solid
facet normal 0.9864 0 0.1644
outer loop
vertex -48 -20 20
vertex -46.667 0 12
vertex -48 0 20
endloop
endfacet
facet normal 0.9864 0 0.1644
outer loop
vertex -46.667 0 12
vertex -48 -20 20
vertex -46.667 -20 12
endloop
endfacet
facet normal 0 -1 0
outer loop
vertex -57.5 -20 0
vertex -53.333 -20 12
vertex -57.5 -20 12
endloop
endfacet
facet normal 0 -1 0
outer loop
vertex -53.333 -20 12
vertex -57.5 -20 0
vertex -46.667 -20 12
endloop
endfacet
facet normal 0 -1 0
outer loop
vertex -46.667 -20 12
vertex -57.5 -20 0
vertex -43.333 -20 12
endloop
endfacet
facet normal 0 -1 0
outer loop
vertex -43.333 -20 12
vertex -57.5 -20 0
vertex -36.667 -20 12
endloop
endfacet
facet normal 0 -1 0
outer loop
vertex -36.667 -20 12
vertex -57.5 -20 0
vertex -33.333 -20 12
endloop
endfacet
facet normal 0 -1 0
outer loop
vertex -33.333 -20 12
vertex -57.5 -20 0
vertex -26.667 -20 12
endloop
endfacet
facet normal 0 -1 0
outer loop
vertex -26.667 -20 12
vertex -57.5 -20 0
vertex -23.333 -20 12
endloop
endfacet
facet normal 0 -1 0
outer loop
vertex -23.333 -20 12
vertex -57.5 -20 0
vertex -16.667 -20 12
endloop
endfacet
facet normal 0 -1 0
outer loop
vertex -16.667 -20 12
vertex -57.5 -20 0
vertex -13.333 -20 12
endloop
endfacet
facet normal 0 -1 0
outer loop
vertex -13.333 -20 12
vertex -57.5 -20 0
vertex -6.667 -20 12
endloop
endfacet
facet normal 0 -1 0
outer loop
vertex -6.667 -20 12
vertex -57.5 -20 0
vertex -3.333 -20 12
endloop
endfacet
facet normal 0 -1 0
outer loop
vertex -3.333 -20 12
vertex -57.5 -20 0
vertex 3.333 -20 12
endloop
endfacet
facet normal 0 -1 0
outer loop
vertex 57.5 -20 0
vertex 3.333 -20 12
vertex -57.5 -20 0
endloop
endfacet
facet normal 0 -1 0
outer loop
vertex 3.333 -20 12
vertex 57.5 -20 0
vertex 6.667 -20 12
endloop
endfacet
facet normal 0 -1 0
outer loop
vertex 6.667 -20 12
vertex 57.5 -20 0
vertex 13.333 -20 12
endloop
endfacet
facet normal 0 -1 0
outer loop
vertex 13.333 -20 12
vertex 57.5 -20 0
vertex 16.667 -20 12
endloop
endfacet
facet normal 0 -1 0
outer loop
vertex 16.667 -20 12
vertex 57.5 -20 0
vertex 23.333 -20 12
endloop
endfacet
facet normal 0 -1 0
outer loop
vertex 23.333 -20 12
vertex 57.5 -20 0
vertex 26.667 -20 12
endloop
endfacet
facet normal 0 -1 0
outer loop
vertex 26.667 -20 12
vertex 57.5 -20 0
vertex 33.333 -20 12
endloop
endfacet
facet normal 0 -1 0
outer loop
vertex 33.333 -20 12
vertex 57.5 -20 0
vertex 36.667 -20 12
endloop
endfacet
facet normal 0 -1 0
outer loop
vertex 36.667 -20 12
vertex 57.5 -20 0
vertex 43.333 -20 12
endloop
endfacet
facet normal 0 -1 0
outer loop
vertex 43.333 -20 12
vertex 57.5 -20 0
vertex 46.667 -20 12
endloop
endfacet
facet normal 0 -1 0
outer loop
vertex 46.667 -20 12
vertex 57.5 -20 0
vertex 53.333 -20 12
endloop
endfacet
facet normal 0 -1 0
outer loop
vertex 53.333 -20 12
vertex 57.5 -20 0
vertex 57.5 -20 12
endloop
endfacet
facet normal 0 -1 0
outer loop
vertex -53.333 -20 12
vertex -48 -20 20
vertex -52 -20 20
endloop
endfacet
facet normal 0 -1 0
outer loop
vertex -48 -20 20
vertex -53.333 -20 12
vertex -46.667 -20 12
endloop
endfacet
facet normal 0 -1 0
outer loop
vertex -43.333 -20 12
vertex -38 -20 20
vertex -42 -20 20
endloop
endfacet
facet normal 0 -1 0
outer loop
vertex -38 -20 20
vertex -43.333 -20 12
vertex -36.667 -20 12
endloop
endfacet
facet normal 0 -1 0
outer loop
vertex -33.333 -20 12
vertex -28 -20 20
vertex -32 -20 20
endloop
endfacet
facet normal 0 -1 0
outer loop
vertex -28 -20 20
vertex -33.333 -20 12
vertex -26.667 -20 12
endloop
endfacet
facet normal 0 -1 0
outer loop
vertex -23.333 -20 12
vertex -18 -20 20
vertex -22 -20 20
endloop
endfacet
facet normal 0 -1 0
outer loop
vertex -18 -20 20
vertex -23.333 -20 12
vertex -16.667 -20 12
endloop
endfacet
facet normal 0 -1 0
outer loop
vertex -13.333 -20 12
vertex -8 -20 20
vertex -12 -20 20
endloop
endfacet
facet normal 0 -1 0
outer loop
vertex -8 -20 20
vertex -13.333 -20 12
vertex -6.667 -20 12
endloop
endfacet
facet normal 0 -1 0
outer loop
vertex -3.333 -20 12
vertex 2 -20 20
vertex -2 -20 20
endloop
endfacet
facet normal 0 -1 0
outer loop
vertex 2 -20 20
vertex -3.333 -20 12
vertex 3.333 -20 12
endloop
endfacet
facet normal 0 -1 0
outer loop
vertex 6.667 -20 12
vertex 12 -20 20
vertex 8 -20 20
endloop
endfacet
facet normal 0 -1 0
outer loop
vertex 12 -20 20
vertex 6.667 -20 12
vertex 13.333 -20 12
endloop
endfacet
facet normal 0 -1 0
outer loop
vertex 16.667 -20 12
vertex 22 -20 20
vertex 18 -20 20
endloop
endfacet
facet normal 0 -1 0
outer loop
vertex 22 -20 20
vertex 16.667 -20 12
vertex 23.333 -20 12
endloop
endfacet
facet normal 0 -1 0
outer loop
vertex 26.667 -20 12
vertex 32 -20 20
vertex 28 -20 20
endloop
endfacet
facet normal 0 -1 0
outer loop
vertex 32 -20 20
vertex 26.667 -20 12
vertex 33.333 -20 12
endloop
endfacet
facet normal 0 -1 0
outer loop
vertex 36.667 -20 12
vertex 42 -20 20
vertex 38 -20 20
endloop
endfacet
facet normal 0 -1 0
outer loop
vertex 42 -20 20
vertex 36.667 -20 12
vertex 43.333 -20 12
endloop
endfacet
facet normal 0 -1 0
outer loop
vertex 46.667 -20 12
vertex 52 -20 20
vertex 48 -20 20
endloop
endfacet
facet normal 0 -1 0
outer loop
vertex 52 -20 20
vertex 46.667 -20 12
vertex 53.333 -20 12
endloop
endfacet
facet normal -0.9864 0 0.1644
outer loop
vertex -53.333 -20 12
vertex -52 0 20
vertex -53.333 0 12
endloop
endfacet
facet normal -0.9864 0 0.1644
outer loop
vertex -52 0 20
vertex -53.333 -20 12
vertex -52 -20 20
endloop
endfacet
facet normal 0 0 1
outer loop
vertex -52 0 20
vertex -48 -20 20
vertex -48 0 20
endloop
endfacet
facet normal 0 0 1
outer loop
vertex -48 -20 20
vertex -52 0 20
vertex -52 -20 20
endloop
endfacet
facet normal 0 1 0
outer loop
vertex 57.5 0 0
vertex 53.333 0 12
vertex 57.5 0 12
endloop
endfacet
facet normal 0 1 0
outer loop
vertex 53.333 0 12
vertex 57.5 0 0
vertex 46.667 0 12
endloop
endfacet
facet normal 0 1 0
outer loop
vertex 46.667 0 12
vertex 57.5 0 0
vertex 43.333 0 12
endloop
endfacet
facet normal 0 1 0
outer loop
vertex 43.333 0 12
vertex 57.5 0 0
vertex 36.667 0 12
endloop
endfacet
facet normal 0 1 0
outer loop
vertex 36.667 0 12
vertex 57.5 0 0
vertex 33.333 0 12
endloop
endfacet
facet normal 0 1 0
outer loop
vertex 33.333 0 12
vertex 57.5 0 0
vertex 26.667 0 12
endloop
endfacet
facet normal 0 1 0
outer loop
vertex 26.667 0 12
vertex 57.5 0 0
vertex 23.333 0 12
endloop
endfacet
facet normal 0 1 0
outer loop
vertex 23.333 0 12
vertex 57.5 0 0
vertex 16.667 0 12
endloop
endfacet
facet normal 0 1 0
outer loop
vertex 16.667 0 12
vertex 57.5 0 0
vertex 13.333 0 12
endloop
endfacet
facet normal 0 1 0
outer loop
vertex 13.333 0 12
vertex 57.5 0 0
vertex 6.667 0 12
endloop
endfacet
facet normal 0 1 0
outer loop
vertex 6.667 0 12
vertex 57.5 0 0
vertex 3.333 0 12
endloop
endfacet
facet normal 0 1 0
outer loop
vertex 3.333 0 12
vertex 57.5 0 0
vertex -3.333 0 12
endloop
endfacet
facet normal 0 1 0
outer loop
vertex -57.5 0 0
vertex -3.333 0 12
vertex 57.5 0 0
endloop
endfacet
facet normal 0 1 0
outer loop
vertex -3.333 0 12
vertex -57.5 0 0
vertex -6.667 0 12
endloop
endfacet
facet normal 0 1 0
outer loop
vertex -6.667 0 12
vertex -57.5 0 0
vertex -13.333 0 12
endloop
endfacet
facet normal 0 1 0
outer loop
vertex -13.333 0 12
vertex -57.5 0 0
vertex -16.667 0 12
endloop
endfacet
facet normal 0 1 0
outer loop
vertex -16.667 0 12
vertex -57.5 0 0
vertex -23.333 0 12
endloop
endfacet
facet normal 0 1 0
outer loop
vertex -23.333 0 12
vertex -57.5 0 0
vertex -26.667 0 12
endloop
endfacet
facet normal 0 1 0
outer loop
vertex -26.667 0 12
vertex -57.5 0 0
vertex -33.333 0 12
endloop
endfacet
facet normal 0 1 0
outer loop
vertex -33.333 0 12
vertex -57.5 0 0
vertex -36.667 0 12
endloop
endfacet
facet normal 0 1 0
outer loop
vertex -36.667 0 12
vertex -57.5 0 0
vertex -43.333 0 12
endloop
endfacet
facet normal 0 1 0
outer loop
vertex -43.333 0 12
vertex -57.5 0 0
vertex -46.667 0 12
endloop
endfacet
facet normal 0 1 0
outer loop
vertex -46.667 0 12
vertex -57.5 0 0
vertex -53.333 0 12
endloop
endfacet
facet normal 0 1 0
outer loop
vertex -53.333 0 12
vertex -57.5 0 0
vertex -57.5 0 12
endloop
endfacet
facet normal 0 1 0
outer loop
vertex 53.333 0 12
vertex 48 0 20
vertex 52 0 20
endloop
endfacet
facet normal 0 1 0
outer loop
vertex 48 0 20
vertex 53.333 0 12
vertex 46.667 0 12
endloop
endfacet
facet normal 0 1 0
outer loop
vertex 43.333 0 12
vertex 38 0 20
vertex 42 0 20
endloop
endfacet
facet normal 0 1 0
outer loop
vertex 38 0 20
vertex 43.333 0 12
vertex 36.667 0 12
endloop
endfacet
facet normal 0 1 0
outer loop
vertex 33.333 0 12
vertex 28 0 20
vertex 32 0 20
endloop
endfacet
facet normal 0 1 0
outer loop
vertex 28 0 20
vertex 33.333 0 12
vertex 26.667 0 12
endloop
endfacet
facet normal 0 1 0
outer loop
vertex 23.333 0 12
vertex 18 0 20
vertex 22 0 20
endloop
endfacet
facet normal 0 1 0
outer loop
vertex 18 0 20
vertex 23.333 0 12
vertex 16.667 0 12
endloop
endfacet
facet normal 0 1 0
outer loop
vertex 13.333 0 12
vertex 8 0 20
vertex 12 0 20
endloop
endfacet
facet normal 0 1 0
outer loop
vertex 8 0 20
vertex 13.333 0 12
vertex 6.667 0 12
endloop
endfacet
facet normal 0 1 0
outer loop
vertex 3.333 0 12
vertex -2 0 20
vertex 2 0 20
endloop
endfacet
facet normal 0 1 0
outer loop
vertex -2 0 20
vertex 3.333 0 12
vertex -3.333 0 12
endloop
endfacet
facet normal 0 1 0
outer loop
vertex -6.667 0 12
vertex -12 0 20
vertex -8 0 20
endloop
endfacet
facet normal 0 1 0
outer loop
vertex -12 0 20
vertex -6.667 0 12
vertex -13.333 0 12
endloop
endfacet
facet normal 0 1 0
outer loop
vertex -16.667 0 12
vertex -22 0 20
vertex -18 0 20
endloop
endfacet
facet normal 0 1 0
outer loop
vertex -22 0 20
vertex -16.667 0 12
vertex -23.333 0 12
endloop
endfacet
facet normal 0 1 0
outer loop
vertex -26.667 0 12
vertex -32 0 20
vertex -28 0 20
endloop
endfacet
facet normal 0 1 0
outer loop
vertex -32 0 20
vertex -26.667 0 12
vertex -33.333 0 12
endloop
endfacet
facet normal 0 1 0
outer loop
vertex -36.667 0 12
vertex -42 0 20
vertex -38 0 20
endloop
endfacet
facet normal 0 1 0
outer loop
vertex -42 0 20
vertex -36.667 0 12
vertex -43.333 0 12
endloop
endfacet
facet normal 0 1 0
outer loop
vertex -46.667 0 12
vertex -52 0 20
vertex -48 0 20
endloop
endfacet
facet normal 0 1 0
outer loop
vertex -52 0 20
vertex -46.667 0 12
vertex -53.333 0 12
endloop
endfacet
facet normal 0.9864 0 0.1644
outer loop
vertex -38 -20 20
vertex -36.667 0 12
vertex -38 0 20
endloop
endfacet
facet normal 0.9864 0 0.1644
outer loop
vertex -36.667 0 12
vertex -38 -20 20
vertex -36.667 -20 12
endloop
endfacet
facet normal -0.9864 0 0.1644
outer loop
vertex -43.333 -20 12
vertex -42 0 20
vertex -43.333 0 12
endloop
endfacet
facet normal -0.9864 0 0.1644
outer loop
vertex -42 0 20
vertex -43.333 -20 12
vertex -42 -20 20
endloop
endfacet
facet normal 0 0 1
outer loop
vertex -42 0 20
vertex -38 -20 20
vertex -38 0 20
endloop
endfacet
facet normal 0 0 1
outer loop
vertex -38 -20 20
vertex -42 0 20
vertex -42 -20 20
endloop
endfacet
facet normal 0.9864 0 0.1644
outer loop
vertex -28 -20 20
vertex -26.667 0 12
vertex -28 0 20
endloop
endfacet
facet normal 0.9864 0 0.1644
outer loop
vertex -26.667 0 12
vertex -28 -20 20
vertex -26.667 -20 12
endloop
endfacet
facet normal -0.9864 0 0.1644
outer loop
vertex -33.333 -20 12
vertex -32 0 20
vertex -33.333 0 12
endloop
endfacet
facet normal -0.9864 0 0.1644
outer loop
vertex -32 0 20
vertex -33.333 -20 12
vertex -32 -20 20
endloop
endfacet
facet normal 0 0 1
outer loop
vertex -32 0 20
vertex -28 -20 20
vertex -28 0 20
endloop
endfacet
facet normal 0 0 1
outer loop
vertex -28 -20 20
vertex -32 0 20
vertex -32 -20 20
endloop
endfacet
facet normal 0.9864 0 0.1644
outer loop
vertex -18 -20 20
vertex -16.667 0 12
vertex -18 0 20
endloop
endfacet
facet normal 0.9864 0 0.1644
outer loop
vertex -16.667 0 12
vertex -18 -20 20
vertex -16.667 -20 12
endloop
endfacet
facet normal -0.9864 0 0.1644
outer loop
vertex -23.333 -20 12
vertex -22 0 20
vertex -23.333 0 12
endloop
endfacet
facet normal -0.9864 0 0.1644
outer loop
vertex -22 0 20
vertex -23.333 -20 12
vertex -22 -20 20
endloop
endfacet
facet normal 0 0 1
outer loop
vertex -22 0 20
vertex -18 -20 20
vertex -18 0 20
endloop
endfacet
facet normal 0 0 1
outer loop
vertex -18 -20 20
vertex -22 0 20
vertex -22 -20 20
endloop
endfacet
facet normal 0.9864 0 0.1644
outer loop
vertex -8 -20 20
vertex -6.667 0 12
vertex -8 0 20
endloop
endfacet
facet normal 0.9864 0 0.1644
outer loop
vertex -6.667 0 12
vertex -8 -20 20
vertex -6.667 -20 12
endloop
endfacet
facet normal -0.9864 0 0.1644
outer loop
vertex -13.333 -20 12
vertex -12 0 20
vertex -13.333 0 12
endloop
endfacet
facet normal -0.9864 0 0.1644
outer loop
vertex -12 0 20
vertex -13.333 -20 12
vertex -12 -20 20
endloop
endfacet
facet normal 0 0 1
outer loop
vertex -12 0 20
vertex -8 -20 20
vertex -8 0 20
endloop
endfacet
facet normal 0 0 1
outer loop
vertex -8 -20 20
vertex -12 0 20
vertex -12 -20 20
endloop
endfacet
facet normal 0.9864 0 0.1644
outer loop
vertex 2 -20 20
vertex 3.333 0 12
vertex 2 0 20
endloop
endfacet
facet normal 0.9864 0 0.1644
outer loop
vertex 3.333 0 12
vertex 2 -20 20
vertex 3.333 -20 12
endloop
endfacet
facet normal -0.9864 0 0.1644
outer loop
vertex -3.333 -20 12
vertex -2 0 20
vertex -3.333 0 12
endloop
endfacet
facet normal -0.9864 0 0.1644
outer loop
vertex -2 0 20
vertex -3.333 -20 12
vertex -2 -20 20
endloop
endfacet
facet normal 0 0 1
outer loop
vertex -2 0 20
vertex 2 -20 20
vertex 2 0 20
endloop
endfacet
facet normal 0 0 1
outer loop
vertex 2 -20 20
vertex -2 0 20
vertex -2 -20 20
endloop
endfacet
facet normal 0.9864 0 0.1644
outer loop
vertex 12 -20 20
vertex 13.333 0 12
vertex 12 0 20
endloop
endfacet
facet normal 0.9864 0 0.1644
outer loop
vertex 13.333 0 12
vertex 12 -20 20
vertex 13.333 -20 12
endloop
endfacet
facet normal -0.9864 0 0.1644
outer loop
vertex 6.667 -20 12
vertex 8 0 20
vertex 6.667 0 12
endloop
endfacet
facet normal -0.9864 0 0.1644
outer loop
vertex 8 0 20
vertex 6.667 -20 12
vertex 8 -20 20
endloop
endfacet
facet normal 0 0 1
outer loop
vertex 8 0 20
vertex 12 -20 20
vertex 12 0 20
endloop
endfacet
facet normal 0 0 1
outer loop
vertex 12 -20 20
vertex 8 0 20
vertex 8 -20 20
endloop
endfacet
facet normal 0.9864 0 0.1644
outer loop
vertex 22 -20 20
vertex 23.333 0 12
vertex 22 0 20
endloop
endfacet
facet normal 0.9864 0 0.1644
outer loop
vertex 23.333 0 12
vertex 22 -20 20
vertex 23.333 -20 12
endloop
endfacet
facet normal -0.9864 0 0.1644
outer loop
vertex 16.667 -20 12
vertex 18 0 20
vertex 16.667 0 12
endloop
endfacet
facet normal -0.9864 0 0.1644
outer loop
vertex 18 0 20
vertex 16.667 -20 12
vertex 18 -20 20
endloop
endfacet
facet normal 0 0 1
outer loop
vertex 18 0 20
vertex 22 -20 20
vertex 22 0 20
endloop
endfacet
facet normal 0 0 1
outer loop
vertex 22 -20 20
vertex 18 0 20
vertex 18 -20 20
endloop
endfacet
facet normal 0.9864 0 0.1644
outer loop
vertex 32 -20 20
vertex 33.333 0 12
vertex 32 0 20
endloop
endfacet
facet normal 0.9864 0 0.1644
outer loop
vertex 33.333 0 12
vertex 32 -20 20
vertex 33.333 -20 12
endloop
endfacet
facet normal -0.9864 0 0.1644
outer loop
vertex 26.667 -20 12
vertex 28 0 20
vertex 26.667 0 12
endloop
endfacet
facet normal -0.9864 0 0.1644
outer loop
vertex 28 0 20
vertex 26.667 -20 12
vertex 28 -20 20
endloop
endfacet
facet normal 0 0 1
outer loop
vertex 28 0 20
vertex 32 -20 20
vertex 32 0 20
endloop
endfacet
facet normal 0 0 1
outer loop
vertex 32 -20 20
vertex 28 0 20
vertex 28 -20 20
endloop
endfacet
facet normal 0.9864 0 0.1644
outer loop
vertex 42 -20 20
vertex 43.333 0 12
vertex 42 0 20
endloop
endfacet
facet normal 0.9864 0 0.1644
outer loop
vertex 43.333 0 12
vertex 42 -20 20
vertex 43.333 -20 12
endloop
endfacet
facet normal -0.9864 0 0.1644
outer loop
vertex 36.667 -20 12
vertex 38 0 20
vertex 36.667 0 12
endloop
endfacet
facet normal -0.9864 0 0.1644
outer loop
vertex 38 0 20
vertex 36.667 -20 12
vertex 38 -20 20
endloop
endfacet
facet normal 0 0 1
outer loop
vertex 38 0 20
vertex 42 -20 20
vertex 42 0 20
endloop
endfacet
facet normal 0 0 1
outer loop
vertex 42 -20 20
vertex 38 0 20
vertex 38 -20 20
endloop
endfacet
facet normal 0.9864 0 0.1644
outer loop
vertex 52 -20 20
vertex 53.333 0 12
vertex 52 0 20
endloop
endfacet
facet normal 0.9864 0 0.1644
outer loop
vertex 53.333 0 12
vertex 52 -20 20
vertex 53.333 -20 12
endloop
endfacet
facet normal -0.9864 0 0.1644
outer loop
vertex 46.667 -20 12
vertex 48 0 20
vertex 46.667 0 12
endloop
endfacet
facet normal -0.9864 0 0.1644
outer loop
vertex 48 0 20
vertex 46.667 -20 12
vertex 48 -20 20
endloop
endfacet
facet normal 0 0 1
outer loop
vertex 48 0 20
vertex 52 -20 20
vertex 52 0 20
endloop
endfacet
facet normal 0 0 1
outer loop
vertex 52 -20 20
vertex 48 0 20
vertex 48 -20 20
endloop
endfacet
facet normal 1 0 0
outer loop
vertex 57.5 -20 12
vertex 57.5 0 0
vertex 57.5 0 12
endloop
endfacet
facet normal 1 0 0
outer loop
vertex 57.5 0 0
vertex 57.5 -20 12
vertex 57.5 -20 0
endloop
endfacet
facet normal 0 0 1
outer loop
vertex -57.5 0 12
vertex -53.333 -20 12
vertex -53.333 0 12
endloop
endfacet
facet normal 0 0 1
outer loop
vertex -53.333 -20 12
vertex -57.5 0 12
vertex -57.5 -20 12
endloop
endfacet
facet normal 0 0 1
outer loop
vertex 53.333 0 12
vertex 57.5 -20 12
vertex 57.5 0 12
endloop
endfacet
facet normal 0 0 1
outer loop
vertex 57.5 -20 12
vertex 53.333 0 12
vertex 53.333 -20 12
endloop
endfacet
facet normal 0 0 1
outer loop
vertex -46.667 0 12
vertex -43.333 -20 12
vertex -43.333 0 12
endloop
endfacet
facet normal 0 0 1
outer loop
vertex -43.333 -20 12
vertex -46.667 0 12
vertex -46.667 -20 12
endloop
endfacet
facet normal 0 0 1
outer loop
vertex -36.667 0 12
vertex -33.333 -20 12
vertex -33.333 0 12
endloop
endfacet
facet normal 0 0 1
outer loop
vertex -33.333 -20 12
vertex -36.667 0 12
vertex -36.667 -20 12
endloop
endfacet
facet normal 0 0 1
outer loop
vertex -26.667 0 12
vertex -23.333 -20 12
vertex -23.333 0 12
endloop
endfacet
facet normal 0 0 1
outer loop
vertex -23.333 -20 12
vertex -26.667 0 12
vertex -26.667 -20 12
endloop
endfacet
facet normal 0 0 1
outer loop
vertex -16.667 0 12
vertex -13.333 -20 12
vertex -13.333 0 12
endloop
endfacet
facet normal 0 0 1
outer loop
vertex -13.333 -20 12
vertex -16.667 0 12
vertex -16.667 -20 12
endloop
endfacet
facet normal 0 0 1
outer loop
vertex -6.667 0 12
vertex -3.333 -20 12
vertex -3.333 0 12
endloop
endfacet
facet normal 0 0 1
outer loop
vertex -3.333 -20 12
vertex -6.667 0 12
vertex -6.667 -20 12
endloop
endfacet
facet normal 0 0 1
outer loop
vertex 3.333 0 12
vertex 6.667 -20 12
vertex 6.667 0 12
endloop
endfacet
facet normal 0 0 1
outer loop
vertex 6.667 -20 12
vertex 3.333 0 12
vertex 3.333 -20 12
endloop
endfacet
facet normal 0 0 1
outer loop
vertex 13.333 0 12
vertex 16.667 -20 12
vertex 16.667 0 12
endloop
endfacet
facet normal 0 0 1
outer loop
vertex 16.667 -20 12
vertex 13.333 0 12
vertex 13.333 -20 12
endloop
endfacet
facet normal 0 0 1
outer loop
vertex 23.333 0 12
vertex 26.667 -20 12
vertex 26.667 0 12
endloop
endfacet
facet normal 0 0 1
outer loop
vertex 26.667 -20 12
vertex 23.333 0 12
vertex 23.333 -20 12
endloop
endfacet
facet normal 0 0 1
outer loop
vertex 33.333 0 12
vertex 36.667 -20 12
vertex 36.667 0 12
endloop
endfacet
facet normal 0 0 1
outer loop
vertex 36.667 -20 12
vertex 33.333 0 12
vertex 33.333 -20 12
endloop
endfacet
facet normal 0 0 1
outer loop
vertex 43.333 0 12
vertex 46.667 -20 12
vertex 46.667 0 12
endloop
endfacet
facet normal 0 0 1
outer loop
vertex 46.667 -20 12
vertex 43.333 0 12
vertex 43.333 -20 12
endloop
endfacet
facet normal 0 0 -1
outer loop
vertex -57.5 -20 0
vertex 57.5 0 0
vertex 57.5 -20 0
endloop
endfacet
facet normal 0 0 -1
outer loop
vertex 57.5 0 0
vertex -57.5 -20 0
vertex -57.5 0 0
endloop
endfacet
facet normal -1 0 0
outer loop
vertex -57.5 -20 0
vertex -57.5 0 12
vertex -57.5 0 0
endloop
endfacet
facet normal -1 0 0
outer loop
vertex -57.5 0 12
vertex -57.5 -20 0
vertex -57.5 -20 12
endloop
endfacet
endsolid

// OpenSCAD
$fn = 32;

// ----------------------------------------------------------------------
// Toothed rack, 11 teeth
// 10 mm pitch, 8 mm teeth
// ----------------------------------------------------------------------

// --- parameters (mm) ---
bar_w = 20;   // bar width (Y)
bar_h = 12;   // bar height (Z)
teeth = 11;   // number of teeth
pitch = 10;   // tooth pitch
tooth_h = 8;  // tooth height above the bar
root_w = 7;   // tooth width at the root
crest_w = 4;  // tooth width at the crest

// --- derived feature positions (mm) ---
span = (teeth - 1) * pitch;  // = 100   distance between the outer teeth
bar_l = span + root_w + 8;   // = 115   bar length: teeth plus 4 mm at each end
tooth_x = -span / 2;         // = -50   X of the first tooth
height = bar_h + tooth_h;    // = 20   overall height
feature_centers = [
  [tooth_x + 0 * pitch, -bar_w / 2],
  [tooth_x + 1 * pitch, -bar_w / 2],
  [tooth_x + 2 * pitch, -bar_w / 2],
  [tooth_x + 3 * pitch, -bar_w / 2],
  [tooth_x + 4 * pitch, -bar_w / 2],
  [tooth_x + 5 * pitch, -bar_w / 2],
  [tooth_x + 6 * pitch, -bar_w / 2],
  [tooth_x + 7 * pitch, -bar_w / 2],
  [tooth_x + 8 * pitch, -bar_w / 2],
  [tooth_x + 9 * pitch, -bar_w / 2],
  [tooth_x + 10 * pitch, -bar_w / 2]
];   // tooth centre line, drives the tooth loop

// bar with a rack of teeth, one extruded trapezoium per centre
module rack_tooth() {
  linear_extrude(height = bar_w)
    polygon(points = [
      [0, 0],
      [root_w, 0],
      [root_w / 2 + crest_w / 2, tooth_h + 1],
      [root_w / 2 - crest_w / 2, tooth_h + 1]
    ]);
}

union() {
  translate([-bar_l / 2, -bar_w, 0]) cube([bar_l, bar_w, bar_h]);
  for (centre = feature_centers)
    translate([centre[0] - root_w / 2, 0, bar_h - 1]) rotate([90, 0, 0]) rack_tooth();
}
